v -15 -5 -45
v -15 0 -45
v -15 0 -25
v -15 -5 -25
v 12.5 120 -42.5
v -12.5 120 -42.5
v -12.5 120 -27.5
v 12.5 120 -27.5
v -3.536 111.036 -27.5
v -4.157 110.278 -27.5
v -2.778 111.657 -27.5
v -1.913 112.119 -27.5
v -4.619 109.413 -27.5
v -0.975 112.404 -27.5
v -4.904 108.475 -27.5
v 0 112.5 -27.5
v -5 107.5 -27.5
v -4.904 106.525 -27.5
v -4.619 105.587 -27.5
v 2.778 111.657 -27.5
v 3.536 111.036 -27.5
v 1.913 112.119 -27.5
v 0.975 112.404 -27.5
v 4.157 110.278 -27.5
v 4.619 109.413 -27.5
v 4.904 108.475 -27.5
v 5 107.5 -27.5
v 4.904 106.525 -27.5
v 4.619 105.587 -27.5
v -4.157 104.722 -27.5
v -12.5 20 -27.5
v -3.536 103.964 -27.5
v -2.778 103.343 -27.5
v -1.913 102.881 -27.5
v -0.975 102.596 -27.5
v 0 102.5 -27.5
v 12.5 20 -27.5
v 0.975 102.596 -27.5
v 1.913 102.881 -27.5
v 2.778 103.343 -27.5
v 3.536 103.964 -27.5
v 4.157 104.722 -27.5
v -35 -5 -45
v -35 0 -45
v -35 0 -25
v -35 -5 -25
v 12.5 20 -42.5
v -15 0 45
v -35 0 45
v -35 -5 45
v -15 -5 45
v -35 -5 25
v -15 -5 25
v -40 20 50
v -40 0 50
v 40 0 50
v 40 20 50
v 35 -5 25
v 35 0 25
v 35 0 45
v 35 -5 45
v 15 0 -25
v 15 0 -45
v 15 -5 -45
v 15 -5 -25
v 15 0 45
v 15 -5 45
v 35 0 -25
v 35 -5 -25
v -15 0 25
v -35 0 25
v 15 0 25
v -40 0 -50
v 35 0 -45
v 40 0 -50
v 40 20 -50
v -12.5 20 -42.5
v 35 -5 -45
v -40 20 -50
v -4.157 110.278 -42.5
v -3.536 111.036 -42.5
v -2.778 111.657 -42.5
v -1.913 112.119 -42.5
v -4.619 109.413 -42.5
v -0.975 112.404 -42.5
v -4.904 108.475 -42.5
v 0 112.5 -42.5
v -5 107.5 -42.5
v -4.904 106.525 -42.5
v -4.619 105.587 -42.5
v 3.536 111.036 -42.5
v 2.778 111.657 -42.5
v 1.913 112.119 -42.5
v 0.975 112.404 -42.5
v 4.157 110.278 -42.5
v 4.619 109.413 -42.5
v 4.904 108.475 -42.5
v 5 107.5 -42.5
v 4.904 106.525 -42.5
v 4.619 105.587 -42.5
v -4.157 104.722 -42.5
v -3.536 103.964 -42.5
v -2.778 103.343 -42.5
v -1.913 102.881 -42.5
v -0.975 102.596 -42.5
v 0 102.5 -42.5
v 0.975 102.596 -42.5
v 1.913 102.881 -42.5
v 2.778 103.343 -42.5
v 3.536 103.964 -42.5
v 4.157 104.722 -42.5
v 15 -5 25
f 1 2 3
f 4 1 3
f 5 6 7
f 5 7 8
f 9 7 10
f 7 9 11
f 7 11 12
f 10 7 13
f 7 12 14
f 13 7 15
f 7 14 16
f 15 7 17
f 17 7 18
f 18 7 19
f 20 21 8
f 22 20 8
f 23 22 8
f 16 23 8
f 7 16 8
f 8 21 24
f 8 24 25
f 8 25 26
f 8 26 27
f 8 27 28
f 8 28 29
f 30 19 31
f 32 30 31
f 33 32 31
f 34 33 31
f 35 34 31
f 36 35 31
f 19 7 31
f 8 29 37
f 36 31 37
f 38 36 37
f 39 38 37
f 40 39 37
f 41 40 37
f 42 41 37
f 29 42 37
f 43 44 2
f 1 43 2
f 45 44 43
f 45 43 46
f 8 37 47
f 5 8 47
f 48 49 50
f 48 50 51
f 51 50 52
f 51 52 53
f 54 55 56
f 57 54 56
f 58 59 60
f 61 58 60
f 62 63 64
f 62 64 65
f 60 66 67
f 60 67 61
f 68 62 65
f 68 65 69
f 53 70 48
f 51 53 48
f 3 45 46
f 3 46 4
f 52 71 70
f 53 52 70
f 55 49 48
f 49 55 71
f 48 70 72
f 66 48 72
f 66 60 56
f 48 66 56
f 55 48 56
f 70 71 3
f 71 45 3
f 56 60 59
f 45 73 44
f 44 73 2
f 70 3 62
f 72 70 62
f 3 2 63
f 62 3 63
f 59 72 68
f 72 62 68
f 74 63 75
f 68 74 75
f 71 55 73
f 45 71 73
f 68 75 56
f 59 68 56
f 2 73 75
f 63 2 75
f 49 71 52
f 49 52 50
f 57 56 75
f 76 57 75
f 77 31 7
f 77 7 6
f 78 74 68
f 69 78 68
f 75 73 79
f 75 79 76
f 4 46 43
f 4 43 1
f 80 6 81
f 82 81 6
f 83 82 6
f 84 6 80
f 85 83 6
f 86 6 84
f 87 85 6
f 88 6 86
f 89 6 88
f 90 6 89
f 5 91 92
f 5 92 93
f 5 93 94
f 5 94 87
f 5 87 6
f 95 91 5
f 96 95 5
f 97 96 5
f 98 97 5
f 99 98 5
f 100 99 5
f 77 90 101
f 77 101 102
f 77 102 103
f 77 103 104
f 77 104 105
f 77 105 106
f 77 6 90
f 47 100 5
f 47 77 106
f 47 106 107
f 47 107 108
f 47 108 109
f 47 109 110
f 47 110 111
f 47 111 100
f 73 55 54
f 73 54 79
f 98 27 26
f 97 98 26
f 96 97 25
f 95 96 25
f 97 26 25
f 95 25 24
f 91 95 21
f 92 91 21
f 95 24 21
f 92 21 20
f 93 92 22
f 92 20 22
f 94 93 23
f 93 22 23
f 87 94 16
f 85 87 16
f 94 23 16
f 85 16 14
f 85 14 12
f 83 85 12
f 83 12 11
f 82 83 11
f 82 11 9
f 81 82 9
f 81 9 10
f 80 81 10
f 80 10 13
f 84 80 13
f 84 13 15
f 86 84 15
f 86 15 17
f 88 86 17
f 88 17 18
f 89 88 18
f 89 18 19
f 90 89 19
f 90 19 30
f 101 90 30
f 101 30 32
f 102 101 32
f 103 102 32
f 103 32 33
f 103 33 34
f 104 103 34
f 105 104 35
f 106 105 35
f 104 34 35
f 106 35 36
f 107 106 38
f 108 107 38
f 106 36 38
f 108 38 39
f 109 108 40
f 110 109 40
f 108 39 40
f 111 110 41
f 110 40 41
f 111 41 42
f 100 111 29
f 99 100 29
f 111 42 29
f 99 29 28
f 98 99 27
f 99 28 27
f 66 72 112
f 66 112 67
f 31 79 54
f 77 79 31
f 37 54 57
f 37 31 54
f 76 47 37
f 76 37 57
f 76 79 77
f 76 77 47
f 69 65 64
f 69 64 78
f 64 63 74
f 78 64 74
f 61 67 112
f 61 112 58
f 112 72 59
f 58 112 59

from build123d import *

# Parameters (mm, degrees)
SKETCH1_W           = 80
SKETCH1_H           = 100
BOSS_EXTRUDE2_DEPTH = 20
SKETCH2_W           = 25
SKETCH2_H           = 15
BOSS_EXTRUDE3_DEPTH = 100
CUT_EXTRUDE1_REACH  = 150.345
SKETCH3_R           = 5
SKETCH4_W           = 20
SKETCH4_H           = 20
BOSS_EXTRUDE4_DEPTH = 5


with BuildPart() as part:
    # Sketch1 → Boss-Extrude2 (new body)
    with BuildSketch(Plane(origin=(0, 0, 0), x_dir=(1, 0, 0), z_dir=(0, 1, 0))):
        Rectangle(SKETCH1_W, SKETCH1_H)
    extrude(amount=BOSS_EXTRUDE2_DEPTH)

    # Sketch2 → Boss-Extrude3 (add)
    with BuildSketch(Plane(origin=(0, 20, 0), x_dir=(1, 0, 0), z_dir=(0, 1, 0))):
        with Locations((0, 35)):
            Rectangle(SKETCH2_W, SKETCH2_H)
    extrude(amount=BOSS_EXTRUDE3_DEPTH)

    # Sketch3 → Cut-Extrude1 (cut, up to next)
    with BuildSketch(Plane.XY.offset(-27.5), mode=Mode.PRIVATE) as cut_extrude1_sk1:
        with Locations((0, 107.5)):
            Circle(SKETCH3_R)
    cut_extrude1_tool1 = extrude(cut_extrude1_sk1.sketch, amount=-CUT_EXTRUDE1_REACH, mode=Mode.PRIVATE) & part.part
    add(cut_extrude1_tool1.solids().sort_by_distance((0, 107.5, -27.5))[0], mode=Mode.SUBTRACT)

    # Sketch4 → Boss-Extrude4 (add)
    with BuildSketch(Plane.XZ):
        with Locations((-25, 35)):
            Rectangle(SKETCH4_W, SKETCH4_H)
        with Locations((25, 35)):
            Rectangle(SKETCH4_W, SKETCH4_H)
        with Locations((25, -35)):
            Rectangle(SKETCH4_W, SKETCH4_H)
        with Locations((-25, -35)):
            Rectangle(SKETCH4_W, SKETCH4_H)
    extrude(amount=BOSS_EXTRUDE4_DEPTH)


solid = part.part
